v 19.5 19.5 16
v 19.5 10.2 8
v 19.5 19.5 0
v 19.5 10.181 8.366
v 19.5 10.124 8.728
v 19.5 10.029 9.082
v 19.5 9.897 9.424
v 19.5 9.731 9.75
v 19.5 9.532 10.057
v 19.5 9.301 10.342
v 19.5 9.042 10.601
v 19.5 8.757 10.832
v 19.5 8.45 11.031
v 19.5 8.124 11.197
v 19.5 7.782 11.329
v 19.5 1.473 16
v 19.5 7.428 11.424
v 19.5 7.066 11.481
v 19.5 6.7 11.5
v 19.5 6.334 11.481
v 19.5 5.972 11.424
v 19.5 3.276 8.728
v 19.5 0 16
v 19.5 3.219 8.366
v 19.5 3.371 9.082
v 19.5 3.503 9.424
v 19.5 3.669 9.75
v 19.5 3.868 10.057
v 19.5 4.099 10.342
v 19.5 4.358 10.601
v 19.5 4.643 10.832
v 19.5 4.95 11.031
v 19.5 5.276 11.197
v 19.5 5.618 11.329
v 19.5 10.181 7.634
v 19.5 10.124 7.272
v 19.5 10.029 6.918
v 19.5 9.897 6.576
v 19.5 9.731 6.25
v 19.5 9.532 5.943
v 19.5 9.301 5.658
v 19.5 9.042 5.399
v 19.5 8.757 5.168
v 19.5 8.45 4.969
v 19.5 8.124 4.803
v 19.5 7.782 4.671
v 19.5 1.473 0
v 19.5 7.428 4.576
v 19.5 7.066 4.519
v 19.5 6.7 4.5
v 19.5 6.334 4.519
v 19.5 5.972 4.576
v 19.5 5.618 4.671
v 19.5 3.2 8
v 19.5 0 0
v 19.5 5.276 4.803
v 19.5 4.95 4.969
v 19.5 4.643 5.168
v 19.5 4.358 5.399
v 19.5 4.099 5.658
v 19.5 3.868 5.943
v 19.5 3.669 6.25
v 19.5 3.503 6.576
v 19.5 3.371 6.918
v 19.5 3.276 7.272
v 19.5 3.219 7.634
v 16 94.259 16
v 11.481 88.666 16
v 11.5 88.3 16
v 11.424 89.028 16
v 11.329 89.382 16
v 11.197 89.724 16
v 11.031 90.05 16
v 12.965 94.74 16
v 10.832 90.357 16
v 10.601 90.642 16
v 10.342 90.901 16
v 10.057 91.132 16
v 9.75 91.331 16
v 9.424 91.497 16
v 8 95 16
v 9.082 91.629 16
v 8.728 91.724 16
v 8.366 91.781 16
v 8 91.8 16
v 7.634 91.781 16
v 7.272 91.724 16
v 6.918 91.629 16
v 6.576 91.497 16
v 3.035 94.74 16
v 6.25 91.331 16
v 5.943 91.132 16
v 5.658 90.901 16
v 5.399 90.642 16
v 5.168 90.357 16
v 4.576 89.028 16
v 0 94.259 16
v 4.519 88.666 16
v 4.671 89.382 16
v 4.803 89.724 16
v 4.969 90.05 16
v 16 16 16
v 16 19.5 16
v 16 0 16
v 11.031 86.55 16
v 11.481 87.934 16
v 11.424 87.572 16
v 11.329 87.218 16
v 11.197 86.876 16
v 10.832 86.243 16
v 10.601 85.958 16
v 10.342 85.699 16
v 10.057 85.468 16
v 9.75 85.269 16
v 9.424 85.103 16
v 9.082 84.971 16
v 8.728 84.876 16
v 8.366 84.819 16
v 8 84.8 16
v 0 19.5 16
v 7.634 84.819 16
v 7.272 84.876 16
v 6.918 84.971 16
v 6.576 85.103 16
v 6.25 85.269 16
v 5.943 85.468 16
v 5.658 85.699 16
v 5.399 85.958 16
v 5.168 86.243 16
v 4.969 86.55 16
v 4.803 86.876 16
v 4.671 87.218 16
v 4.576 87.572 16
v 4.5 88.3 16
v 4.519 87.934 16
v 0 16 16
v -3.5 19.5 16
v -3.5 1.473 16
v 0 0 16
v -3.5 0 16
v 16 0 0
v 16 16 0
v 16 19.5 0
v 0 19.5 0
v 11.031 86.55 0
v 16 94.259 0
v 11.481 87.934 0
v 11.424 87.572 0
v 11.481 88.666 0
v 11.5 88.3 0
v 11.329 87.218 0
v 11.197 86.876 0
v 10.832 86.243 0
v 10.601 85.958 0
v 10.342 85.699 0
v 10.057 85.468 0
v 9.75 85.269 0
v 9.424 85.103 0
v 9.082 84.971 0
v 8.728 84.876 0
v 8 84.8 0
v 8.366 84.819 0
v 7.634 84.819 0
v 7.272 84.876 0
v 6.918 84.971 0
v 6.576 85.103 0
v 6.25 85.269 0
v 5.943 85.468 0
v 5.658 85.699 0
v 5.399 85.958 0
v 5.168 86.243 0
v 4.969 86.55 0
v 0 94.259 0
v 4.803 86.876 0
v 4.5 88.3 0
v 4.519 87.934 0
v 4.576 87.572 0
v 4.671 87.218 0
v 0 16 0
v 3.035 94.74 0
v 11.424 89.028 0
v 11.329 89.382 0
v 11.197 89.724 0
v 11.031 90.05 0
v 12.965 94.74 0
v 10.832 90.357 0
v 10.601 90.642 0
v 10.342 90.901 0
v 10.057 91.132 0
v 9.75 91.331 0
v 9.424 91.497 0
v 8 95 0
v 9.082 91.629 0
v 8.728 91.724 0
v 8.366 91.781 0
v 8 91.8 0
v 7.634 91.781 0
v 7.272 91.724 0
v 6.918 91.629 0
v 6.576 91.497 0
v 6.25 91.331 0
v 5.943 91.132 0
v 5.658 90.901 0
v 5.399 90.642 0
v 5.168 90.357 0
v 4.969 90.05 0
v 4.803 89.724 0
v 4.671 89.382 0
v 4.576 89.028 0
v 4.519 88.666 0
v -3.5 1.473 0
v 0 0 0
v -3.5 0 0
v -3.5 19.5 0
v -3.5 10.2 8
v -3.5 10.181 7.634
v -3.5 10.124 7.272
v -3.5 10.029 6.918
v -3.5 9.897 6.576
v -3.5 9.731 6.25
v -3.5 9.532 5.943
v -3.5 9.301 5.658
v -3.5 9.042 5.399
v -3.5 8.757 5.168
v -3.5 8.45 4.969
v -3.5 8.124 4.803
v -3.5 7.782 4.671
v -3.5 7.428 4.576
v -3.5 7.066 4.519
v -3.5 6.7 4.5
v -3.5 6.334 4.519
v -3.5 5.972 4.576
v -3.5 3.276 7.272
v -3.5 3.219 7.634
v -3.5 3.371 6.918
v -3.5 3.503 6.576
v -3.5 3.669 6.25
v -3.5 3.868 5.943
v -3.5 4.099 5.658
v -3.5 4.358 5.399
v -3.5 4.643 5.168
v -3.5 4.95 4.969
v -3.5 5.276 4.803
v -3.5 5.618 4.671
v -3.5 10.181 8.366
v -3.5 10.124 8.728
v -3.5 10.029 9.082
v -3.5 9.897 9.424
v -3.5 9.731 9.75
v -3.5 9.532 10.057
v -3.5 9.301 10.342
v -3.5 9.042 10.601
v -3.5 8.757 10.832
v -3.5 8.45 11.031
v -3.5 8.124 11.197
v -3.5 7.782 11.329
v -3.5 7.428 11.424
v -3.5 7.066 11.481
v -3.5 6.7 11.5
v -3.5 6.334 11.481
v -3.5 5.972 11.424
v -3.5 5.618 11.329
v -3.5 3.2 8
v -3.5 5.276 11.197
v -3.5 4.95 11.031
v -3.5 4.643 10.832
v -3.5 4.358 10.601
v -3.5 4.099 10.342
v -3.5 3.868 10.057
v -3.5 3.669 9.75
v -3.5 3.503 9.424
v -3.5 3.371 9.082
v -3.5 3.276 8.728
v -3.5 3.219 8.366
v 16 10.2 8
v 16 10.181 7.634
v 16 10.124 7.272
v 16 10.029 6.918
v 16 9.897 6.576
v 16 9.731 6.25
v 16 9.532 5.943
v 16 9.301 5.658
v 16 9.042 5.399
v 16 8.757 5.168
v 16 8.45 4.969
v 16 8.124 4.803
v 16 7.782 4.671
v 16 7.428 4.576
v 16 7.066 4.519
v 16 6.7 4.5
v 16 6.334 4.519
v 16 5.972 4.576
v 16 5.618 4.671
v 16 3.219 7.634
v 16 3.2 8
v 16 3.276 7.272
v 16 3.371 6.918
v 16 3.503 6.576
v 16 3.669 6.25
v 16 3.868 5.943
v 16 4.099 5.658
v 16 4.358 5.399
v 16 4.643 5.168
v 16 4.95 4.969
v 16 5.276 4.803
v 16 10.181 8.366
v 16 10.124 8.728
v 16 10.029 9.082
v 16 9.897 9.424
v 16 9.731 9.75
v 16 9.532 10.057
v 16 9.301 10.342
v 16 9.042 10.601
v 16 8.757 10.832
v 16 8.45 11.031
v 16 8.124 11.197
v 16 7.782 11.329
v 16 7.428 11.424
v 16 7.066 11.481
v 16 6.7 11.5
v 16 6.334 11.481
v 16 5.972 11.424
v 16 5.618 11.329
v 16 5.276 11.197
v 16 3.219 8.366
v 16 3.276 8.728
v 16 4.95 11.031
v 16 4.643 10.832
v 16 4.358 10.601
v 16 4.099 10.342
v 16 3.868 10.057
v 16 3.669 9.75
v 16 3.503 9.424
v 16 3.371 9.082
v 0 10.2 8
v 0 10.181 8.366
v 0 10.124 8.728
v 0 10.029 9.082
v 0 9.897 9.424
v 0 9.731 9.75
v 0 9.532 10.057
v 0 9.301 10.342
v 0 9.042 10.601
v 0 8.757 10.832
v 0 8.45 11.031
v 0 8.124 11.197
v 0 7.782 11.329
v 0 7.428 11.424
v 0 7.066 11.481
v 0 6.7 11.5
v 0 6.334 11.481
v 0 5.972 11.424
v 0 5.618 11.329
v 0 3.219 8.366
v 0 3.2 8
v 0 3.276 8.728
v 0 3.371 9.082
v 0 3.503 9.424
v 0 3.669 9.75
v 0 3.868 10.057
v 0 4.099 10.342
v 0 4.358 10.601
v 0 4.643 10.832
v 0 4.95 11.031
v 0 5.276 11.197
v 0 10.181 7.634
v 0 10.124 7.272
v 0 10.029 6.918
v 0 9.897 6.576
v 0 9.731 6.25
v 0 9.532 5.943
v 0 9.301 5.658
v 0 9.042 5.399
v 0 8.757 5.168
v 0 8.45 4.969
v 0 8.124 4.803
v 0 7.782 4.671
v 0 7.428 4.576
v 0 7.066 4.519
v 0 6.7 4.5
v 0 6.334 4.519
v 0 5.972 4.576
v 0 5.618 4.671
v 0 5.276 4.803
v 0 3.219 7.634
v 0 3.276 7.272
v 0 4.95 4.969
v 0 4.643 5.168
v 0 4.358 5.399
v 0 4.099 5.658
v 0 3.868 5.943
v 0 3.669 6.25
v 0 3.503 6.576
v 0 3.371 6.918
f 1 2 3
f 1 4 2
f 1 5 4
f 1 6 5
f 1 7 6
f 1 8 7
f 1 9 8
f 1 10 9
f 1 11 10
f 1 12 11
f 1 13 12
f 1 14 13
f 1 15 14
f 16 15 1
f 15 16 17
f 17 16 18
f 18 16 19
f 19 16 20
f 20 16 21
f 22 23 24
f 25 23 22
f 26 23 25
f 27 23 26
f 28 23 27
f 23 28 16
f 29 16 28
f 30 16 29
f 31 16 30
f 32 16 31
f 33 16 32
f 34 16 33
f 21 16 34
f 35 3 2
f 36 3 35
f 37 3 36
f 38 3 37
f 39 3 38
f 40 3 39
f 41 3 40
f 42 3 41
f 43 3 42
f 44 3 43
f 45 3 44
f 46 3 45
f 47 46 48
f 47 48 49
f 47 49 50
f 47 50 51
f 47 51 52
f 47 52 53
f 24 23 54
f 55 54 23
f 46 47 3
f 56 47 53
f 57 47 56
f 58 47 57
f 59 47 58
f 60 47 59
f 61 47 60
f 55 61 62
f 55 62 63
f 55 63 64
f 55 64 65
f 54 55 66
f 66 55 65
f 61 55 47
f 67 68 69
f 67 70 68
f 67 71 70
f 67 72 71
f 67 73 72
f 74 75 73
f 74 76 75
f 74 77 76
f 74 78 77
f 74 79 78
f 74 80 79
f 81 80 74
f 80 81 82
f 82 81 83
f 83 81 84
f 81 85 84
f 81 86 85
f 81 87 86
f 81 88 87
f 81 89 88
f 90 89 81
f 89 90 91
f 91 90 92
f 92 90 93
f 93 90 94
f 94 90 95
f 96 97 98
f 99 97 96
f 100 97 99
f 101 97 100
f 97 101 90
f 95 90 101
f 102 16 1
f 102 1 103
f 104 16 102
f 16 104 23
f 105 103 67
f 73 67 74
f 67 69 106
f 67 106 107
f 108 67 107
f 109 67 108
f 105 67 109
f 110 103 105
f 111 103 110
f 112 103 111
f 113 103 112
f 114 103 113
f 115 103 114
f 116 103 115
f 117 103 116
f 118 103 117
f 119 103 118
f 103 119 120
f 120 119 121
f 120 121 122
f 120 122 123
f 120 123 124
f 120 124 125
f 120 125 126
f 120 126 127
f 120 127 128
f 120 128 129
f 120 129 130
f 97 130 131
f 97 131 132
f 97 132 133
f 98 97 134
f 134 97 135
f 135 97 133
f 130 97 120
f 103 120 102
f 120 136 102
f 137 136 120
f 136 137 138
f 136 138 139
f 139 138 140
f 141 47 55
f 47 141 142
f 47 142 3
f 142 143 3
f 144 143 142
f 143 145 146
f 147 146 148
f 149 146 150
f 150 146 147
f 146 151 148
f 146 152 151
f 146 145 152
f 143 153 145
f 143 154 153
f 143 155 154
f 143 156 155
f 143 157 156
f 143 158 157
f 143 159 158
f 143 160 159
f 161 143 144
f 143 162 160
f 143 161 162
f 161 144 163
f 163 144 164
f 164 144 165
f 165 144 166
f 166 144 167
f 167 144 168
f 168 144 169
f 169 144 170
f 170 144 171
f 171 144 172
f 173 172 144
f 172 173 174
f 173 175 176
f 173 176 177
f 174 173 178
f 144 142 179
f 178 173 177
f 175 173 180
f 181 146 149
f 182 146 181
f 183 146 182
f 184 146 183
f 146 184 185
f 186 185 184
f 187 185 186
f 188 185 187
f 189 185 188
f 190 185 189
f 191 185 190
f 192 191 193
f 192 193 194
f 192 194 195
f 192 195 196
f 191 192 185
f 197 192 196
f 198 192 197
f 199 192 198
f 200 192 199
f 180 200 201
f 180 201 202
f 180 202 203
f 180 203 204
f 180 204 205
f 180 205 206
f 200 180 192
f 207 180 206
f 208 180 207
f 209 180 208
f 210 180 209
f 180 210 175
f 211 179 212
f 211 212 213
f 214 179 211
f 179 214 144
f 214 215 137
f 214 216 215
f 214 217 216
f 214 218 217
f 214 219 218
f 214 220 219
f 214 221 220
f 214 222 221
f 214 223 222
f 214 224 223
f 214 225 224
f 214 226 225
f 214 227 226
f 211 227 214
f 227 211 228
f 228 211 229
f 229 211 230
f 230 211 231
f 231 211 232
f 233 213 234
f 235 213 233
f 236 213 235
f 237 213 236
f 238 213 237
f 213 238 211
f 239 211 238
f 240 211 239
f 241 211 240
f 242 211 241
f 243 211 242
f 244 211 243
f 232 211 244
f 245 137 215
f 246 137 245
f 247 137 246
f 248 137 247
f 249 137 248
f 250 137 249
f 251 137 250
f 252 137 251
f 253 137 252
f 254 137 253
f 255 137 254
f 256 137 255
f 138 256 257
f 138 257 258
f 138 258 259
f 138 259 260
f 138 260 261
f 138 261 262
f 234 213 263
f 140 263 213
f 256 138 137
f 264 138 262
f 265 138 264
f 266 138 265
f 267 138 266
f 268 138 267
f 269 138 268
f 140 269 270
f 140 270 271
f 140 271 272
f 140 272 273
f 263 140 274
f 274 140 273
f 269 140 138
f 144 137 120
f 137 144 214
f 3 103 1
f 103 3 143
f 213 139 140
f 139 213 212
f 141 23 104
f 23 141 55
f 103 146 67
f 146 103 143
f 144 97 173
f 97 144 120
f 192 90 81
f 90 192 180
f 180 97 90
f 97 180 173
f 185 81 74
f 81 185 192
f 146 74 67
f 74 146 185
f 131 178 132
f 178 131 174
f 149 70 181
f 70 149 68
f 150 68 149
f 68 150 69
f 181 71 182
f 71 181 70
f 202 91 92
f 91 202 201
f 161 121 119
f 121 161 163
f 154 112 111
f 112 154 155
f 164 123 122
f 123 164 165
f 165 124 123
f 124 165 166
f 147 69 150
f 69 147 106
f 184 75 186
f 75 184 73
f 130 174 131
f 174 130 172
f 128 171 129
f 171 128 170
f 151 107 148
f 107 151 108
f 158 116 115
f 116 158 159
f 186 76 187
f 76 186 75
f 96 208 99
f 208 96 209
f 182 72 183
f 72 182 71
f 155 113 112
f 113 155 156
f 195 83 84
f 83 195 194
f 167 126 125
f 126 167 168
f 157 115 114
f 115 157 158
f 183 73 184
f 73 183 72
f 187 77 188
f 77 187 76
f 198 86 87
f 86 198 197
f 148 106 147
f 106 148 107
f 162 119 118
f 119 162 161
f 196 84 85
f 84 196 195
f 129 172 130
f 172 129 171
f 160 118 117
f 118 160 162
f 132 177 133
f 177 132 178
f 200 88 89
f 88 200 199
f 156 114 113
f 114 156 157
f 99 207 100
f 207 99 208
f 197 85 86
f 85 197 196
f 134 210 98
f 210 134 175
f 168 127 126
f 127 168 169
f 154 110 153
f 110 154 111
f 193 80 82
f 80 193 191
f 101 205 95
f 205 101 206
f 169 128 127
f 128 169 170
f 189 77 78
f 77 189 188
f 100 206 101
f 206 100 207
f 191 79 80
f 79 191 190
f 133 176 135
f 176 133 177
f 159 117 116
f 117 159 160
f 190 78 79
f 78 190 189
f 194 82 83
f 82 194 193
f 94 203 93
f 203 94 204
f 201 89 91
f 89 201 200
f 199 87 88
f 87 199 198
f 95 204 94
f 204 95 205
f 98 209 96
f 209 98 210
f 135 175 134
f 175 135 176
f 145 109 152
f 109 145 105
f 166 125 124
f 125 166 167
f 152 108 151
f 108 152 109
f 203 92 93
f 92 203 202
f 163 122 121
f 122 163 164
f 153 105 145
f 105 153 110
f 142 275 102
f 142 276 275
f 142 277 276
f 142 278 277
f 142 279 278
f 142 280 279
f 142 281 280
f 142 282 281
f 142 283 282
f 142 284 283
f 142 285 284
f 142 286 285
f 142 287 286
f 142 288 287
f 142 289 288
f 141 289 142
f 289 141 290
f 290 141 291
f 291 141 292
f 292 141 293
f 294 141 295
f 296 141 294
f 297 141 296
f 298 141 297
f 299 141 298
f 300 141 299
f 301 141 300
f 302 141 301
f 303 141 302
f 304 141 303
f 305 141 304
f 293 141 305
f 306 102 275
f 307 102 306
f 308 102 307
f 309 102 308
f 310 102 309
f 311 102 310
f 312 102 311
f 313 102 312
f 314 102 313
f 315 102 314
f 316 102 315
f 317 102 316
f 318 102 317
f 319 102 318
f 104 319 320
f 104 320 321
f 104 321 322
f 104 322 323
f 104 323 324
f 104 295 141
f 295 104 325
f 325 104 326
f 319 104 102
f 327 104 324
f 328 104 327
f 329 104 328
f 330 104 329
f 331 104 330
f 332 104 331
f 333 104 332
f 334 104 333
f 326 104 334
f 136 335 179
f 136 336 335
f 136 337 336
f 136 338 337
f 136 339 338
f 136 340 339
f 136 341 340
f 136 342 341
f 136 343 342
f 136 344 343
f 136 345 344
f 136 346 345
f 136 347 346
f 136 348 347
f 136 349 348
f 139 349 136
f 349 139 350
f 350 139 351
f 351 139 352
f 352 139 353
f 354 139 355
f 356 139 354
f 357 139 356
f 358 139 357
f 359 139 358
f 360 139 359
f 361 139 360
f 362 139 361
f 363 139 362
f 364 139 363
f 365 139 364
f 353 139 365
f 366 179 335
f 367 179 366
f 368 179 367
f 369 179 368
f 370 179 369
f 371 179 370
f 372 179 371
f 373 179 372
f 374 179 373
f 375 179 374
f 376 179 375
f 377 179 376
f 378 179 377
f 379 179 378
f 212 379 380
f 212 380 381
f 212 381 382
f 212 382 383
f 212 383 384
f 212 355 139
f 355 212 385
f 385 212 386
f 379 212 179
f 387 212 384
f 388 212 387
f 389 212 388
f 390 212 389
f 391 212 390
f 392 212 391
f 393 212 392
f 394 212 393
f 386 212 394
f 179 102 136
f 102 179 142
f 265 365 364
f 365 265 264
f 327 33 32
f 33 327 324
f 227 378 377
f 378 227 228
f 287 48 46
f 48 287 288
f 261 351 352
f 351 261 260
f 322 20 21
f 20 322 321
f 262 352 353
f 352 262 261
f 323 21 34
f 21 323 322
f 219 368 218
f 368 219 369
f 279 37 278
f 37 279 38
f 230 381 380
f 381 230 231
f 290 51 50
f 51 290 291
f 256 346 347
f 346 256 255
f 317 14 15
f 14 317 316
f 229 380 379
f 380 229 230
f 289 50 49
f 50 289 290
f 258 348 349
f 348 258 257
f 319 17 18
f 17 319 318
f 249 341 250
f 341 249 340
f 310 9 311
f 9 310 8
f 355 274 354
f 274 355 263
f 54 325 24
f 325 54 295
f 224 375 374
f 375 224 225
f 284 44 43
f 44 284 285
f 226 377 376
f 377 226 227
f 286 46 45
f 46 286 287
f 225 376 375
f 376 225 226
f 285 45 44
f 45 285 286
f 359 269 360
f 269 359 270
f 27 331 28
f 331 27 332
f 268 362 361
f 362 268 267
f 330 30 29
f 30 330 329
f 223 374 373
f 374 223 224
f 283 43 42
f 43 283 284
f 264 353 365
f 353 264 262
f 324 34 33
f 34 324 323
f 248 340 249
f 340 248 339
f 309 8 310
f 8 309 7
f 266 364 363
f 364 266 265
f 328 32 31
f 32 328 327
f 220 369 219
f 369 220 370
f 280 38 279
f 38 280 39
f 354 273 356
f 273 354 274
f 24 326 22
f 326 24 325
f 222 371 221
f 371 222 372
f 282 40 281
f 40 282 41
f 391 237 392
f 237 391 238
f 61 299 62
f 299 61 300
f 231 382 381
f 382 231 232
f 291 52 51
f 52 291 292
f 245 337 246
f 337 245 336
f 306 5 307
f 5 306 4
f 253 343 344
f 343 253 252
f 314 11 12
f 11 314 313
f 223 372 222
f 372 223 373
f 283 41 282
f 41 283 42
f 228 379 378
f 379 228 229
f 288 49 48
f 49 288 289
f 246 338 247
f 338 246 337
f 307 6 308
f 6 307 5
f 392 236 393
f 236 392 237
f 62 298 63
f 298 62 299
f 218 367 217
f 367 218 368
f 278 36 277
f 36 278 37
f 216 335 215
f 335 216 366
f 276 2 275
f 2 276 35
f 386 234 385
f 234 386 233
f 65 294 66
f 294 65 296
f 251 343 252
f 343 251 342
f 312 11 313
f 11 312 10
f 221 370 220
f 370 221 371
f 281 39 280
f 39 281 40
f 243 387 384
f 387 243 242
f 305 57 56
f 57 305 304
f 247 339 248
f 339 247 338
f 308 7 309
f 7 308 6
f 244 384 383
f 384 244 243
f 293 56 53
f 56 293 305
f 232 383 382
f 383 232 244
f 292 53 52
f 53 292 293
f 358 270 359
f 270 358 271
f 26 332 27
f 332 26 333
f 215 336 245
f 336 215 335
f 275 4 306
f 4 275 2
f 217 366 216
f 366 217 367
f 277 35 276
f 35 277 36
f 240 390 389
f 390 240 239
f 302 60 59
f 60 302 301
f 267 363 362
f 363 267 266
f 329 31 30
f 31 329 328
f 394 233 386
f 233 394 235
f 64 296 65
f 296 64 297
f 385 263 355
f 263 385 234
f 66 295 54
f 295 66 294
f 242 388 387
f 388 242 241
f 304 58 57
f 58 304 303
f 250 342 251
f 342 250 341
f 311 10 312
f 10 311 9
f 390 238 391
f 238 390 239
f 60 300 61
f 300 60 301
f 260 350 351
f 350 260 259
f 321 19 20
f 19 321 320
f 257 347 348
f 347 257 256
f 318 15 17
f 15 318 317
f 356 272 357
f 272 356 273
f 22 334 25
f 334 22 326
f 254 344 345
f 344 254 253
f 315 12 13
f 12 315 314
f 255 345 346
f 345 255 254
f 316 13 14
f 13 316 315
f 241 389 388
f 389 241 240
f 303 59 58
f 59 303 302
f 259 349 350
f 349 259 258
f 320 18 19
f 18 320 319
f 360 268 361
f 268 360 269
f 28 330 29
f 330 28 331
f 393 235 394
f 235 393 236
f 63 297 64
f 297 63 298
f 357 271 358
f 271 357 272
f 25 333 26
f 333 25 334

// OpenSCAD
// Customizable Connectors
// Author Mathias Dietz
// http://gcodeprintr.dietzm.de


//Overall length
l=95;
//Width and high
wid=16;  // [10:50]

//Radius of screw holes
r1=3.5; // [1.5:0.5:6]

//Hole direction
hole=0;// [0:vertical,1:horizontal]

/* [Hidden] */
t=3.5; 
lochabstand=wid/5+r1;
$fn=60;
//Height
h=wid;

difference(){
    union(){
        translate([-t,0,0]) cube([wid+2*t,h+t,h]);
        cube([wid,l,h]);
    }
    cube([wid,h,h]);
    translate([-t-0.5,lochabstand,h/2]) rotate([0,90,0]) cylinder(r=r1,h=wid+2*t+1) ;
    if ( hole == 0){
           #translate([wid/2,l-lochabstand,0]) rotate([0,0,0]) cylinder(r=r1,h=h) ;
         //abgerundet
    difference(){
    translate([wid/2,l/2,-0.5]) cylinder(r=l,h=h+1) ;
    translate([wid/2,l/2,-0.5]) cylinder(r=l/2,h=h+1) ;
    translate([-t,-10,0]) cube([wid+2*t,l,h]) ;    
        }
    } else {
           #translate([0,l-lochabstand,h/2]) rotate([0,90,0]) cylinder(r=r1,h=h) ;
         //abgerundet
   translate([0,0,h]) rotate([0,90,0]) difference(){
    translate([wid/2,l/2,-0.5]) cylinder(r=l,h=h+1) ;
    translate([wid/2,l/2,-0.5]) cylinder(r=l/2,h=h+1) ;
    translate([-t,-10,0]) cube([wid+2*t,l,h]) ;    
        }
    }
    
   
}

module cap(){
kn=6;
difference(){
    union(){
  translate([0,-15,0]) cylinder(r=5.7,h=kn,$fn=30) ;
  translate([-5,-20,0]) cube([10,10,kn]) ;
          translate([0,-22,0]) rotate([0,0,45]) cube([10,10,kn]) ;
    }
        translate([0,-15,kn-3.2]) cylinder(r=4,h=3.2,$fn=6) ;
  translate([0,-15,0]) cylinder(r=2.2,h=kn,$fn=30) ;
}
}
